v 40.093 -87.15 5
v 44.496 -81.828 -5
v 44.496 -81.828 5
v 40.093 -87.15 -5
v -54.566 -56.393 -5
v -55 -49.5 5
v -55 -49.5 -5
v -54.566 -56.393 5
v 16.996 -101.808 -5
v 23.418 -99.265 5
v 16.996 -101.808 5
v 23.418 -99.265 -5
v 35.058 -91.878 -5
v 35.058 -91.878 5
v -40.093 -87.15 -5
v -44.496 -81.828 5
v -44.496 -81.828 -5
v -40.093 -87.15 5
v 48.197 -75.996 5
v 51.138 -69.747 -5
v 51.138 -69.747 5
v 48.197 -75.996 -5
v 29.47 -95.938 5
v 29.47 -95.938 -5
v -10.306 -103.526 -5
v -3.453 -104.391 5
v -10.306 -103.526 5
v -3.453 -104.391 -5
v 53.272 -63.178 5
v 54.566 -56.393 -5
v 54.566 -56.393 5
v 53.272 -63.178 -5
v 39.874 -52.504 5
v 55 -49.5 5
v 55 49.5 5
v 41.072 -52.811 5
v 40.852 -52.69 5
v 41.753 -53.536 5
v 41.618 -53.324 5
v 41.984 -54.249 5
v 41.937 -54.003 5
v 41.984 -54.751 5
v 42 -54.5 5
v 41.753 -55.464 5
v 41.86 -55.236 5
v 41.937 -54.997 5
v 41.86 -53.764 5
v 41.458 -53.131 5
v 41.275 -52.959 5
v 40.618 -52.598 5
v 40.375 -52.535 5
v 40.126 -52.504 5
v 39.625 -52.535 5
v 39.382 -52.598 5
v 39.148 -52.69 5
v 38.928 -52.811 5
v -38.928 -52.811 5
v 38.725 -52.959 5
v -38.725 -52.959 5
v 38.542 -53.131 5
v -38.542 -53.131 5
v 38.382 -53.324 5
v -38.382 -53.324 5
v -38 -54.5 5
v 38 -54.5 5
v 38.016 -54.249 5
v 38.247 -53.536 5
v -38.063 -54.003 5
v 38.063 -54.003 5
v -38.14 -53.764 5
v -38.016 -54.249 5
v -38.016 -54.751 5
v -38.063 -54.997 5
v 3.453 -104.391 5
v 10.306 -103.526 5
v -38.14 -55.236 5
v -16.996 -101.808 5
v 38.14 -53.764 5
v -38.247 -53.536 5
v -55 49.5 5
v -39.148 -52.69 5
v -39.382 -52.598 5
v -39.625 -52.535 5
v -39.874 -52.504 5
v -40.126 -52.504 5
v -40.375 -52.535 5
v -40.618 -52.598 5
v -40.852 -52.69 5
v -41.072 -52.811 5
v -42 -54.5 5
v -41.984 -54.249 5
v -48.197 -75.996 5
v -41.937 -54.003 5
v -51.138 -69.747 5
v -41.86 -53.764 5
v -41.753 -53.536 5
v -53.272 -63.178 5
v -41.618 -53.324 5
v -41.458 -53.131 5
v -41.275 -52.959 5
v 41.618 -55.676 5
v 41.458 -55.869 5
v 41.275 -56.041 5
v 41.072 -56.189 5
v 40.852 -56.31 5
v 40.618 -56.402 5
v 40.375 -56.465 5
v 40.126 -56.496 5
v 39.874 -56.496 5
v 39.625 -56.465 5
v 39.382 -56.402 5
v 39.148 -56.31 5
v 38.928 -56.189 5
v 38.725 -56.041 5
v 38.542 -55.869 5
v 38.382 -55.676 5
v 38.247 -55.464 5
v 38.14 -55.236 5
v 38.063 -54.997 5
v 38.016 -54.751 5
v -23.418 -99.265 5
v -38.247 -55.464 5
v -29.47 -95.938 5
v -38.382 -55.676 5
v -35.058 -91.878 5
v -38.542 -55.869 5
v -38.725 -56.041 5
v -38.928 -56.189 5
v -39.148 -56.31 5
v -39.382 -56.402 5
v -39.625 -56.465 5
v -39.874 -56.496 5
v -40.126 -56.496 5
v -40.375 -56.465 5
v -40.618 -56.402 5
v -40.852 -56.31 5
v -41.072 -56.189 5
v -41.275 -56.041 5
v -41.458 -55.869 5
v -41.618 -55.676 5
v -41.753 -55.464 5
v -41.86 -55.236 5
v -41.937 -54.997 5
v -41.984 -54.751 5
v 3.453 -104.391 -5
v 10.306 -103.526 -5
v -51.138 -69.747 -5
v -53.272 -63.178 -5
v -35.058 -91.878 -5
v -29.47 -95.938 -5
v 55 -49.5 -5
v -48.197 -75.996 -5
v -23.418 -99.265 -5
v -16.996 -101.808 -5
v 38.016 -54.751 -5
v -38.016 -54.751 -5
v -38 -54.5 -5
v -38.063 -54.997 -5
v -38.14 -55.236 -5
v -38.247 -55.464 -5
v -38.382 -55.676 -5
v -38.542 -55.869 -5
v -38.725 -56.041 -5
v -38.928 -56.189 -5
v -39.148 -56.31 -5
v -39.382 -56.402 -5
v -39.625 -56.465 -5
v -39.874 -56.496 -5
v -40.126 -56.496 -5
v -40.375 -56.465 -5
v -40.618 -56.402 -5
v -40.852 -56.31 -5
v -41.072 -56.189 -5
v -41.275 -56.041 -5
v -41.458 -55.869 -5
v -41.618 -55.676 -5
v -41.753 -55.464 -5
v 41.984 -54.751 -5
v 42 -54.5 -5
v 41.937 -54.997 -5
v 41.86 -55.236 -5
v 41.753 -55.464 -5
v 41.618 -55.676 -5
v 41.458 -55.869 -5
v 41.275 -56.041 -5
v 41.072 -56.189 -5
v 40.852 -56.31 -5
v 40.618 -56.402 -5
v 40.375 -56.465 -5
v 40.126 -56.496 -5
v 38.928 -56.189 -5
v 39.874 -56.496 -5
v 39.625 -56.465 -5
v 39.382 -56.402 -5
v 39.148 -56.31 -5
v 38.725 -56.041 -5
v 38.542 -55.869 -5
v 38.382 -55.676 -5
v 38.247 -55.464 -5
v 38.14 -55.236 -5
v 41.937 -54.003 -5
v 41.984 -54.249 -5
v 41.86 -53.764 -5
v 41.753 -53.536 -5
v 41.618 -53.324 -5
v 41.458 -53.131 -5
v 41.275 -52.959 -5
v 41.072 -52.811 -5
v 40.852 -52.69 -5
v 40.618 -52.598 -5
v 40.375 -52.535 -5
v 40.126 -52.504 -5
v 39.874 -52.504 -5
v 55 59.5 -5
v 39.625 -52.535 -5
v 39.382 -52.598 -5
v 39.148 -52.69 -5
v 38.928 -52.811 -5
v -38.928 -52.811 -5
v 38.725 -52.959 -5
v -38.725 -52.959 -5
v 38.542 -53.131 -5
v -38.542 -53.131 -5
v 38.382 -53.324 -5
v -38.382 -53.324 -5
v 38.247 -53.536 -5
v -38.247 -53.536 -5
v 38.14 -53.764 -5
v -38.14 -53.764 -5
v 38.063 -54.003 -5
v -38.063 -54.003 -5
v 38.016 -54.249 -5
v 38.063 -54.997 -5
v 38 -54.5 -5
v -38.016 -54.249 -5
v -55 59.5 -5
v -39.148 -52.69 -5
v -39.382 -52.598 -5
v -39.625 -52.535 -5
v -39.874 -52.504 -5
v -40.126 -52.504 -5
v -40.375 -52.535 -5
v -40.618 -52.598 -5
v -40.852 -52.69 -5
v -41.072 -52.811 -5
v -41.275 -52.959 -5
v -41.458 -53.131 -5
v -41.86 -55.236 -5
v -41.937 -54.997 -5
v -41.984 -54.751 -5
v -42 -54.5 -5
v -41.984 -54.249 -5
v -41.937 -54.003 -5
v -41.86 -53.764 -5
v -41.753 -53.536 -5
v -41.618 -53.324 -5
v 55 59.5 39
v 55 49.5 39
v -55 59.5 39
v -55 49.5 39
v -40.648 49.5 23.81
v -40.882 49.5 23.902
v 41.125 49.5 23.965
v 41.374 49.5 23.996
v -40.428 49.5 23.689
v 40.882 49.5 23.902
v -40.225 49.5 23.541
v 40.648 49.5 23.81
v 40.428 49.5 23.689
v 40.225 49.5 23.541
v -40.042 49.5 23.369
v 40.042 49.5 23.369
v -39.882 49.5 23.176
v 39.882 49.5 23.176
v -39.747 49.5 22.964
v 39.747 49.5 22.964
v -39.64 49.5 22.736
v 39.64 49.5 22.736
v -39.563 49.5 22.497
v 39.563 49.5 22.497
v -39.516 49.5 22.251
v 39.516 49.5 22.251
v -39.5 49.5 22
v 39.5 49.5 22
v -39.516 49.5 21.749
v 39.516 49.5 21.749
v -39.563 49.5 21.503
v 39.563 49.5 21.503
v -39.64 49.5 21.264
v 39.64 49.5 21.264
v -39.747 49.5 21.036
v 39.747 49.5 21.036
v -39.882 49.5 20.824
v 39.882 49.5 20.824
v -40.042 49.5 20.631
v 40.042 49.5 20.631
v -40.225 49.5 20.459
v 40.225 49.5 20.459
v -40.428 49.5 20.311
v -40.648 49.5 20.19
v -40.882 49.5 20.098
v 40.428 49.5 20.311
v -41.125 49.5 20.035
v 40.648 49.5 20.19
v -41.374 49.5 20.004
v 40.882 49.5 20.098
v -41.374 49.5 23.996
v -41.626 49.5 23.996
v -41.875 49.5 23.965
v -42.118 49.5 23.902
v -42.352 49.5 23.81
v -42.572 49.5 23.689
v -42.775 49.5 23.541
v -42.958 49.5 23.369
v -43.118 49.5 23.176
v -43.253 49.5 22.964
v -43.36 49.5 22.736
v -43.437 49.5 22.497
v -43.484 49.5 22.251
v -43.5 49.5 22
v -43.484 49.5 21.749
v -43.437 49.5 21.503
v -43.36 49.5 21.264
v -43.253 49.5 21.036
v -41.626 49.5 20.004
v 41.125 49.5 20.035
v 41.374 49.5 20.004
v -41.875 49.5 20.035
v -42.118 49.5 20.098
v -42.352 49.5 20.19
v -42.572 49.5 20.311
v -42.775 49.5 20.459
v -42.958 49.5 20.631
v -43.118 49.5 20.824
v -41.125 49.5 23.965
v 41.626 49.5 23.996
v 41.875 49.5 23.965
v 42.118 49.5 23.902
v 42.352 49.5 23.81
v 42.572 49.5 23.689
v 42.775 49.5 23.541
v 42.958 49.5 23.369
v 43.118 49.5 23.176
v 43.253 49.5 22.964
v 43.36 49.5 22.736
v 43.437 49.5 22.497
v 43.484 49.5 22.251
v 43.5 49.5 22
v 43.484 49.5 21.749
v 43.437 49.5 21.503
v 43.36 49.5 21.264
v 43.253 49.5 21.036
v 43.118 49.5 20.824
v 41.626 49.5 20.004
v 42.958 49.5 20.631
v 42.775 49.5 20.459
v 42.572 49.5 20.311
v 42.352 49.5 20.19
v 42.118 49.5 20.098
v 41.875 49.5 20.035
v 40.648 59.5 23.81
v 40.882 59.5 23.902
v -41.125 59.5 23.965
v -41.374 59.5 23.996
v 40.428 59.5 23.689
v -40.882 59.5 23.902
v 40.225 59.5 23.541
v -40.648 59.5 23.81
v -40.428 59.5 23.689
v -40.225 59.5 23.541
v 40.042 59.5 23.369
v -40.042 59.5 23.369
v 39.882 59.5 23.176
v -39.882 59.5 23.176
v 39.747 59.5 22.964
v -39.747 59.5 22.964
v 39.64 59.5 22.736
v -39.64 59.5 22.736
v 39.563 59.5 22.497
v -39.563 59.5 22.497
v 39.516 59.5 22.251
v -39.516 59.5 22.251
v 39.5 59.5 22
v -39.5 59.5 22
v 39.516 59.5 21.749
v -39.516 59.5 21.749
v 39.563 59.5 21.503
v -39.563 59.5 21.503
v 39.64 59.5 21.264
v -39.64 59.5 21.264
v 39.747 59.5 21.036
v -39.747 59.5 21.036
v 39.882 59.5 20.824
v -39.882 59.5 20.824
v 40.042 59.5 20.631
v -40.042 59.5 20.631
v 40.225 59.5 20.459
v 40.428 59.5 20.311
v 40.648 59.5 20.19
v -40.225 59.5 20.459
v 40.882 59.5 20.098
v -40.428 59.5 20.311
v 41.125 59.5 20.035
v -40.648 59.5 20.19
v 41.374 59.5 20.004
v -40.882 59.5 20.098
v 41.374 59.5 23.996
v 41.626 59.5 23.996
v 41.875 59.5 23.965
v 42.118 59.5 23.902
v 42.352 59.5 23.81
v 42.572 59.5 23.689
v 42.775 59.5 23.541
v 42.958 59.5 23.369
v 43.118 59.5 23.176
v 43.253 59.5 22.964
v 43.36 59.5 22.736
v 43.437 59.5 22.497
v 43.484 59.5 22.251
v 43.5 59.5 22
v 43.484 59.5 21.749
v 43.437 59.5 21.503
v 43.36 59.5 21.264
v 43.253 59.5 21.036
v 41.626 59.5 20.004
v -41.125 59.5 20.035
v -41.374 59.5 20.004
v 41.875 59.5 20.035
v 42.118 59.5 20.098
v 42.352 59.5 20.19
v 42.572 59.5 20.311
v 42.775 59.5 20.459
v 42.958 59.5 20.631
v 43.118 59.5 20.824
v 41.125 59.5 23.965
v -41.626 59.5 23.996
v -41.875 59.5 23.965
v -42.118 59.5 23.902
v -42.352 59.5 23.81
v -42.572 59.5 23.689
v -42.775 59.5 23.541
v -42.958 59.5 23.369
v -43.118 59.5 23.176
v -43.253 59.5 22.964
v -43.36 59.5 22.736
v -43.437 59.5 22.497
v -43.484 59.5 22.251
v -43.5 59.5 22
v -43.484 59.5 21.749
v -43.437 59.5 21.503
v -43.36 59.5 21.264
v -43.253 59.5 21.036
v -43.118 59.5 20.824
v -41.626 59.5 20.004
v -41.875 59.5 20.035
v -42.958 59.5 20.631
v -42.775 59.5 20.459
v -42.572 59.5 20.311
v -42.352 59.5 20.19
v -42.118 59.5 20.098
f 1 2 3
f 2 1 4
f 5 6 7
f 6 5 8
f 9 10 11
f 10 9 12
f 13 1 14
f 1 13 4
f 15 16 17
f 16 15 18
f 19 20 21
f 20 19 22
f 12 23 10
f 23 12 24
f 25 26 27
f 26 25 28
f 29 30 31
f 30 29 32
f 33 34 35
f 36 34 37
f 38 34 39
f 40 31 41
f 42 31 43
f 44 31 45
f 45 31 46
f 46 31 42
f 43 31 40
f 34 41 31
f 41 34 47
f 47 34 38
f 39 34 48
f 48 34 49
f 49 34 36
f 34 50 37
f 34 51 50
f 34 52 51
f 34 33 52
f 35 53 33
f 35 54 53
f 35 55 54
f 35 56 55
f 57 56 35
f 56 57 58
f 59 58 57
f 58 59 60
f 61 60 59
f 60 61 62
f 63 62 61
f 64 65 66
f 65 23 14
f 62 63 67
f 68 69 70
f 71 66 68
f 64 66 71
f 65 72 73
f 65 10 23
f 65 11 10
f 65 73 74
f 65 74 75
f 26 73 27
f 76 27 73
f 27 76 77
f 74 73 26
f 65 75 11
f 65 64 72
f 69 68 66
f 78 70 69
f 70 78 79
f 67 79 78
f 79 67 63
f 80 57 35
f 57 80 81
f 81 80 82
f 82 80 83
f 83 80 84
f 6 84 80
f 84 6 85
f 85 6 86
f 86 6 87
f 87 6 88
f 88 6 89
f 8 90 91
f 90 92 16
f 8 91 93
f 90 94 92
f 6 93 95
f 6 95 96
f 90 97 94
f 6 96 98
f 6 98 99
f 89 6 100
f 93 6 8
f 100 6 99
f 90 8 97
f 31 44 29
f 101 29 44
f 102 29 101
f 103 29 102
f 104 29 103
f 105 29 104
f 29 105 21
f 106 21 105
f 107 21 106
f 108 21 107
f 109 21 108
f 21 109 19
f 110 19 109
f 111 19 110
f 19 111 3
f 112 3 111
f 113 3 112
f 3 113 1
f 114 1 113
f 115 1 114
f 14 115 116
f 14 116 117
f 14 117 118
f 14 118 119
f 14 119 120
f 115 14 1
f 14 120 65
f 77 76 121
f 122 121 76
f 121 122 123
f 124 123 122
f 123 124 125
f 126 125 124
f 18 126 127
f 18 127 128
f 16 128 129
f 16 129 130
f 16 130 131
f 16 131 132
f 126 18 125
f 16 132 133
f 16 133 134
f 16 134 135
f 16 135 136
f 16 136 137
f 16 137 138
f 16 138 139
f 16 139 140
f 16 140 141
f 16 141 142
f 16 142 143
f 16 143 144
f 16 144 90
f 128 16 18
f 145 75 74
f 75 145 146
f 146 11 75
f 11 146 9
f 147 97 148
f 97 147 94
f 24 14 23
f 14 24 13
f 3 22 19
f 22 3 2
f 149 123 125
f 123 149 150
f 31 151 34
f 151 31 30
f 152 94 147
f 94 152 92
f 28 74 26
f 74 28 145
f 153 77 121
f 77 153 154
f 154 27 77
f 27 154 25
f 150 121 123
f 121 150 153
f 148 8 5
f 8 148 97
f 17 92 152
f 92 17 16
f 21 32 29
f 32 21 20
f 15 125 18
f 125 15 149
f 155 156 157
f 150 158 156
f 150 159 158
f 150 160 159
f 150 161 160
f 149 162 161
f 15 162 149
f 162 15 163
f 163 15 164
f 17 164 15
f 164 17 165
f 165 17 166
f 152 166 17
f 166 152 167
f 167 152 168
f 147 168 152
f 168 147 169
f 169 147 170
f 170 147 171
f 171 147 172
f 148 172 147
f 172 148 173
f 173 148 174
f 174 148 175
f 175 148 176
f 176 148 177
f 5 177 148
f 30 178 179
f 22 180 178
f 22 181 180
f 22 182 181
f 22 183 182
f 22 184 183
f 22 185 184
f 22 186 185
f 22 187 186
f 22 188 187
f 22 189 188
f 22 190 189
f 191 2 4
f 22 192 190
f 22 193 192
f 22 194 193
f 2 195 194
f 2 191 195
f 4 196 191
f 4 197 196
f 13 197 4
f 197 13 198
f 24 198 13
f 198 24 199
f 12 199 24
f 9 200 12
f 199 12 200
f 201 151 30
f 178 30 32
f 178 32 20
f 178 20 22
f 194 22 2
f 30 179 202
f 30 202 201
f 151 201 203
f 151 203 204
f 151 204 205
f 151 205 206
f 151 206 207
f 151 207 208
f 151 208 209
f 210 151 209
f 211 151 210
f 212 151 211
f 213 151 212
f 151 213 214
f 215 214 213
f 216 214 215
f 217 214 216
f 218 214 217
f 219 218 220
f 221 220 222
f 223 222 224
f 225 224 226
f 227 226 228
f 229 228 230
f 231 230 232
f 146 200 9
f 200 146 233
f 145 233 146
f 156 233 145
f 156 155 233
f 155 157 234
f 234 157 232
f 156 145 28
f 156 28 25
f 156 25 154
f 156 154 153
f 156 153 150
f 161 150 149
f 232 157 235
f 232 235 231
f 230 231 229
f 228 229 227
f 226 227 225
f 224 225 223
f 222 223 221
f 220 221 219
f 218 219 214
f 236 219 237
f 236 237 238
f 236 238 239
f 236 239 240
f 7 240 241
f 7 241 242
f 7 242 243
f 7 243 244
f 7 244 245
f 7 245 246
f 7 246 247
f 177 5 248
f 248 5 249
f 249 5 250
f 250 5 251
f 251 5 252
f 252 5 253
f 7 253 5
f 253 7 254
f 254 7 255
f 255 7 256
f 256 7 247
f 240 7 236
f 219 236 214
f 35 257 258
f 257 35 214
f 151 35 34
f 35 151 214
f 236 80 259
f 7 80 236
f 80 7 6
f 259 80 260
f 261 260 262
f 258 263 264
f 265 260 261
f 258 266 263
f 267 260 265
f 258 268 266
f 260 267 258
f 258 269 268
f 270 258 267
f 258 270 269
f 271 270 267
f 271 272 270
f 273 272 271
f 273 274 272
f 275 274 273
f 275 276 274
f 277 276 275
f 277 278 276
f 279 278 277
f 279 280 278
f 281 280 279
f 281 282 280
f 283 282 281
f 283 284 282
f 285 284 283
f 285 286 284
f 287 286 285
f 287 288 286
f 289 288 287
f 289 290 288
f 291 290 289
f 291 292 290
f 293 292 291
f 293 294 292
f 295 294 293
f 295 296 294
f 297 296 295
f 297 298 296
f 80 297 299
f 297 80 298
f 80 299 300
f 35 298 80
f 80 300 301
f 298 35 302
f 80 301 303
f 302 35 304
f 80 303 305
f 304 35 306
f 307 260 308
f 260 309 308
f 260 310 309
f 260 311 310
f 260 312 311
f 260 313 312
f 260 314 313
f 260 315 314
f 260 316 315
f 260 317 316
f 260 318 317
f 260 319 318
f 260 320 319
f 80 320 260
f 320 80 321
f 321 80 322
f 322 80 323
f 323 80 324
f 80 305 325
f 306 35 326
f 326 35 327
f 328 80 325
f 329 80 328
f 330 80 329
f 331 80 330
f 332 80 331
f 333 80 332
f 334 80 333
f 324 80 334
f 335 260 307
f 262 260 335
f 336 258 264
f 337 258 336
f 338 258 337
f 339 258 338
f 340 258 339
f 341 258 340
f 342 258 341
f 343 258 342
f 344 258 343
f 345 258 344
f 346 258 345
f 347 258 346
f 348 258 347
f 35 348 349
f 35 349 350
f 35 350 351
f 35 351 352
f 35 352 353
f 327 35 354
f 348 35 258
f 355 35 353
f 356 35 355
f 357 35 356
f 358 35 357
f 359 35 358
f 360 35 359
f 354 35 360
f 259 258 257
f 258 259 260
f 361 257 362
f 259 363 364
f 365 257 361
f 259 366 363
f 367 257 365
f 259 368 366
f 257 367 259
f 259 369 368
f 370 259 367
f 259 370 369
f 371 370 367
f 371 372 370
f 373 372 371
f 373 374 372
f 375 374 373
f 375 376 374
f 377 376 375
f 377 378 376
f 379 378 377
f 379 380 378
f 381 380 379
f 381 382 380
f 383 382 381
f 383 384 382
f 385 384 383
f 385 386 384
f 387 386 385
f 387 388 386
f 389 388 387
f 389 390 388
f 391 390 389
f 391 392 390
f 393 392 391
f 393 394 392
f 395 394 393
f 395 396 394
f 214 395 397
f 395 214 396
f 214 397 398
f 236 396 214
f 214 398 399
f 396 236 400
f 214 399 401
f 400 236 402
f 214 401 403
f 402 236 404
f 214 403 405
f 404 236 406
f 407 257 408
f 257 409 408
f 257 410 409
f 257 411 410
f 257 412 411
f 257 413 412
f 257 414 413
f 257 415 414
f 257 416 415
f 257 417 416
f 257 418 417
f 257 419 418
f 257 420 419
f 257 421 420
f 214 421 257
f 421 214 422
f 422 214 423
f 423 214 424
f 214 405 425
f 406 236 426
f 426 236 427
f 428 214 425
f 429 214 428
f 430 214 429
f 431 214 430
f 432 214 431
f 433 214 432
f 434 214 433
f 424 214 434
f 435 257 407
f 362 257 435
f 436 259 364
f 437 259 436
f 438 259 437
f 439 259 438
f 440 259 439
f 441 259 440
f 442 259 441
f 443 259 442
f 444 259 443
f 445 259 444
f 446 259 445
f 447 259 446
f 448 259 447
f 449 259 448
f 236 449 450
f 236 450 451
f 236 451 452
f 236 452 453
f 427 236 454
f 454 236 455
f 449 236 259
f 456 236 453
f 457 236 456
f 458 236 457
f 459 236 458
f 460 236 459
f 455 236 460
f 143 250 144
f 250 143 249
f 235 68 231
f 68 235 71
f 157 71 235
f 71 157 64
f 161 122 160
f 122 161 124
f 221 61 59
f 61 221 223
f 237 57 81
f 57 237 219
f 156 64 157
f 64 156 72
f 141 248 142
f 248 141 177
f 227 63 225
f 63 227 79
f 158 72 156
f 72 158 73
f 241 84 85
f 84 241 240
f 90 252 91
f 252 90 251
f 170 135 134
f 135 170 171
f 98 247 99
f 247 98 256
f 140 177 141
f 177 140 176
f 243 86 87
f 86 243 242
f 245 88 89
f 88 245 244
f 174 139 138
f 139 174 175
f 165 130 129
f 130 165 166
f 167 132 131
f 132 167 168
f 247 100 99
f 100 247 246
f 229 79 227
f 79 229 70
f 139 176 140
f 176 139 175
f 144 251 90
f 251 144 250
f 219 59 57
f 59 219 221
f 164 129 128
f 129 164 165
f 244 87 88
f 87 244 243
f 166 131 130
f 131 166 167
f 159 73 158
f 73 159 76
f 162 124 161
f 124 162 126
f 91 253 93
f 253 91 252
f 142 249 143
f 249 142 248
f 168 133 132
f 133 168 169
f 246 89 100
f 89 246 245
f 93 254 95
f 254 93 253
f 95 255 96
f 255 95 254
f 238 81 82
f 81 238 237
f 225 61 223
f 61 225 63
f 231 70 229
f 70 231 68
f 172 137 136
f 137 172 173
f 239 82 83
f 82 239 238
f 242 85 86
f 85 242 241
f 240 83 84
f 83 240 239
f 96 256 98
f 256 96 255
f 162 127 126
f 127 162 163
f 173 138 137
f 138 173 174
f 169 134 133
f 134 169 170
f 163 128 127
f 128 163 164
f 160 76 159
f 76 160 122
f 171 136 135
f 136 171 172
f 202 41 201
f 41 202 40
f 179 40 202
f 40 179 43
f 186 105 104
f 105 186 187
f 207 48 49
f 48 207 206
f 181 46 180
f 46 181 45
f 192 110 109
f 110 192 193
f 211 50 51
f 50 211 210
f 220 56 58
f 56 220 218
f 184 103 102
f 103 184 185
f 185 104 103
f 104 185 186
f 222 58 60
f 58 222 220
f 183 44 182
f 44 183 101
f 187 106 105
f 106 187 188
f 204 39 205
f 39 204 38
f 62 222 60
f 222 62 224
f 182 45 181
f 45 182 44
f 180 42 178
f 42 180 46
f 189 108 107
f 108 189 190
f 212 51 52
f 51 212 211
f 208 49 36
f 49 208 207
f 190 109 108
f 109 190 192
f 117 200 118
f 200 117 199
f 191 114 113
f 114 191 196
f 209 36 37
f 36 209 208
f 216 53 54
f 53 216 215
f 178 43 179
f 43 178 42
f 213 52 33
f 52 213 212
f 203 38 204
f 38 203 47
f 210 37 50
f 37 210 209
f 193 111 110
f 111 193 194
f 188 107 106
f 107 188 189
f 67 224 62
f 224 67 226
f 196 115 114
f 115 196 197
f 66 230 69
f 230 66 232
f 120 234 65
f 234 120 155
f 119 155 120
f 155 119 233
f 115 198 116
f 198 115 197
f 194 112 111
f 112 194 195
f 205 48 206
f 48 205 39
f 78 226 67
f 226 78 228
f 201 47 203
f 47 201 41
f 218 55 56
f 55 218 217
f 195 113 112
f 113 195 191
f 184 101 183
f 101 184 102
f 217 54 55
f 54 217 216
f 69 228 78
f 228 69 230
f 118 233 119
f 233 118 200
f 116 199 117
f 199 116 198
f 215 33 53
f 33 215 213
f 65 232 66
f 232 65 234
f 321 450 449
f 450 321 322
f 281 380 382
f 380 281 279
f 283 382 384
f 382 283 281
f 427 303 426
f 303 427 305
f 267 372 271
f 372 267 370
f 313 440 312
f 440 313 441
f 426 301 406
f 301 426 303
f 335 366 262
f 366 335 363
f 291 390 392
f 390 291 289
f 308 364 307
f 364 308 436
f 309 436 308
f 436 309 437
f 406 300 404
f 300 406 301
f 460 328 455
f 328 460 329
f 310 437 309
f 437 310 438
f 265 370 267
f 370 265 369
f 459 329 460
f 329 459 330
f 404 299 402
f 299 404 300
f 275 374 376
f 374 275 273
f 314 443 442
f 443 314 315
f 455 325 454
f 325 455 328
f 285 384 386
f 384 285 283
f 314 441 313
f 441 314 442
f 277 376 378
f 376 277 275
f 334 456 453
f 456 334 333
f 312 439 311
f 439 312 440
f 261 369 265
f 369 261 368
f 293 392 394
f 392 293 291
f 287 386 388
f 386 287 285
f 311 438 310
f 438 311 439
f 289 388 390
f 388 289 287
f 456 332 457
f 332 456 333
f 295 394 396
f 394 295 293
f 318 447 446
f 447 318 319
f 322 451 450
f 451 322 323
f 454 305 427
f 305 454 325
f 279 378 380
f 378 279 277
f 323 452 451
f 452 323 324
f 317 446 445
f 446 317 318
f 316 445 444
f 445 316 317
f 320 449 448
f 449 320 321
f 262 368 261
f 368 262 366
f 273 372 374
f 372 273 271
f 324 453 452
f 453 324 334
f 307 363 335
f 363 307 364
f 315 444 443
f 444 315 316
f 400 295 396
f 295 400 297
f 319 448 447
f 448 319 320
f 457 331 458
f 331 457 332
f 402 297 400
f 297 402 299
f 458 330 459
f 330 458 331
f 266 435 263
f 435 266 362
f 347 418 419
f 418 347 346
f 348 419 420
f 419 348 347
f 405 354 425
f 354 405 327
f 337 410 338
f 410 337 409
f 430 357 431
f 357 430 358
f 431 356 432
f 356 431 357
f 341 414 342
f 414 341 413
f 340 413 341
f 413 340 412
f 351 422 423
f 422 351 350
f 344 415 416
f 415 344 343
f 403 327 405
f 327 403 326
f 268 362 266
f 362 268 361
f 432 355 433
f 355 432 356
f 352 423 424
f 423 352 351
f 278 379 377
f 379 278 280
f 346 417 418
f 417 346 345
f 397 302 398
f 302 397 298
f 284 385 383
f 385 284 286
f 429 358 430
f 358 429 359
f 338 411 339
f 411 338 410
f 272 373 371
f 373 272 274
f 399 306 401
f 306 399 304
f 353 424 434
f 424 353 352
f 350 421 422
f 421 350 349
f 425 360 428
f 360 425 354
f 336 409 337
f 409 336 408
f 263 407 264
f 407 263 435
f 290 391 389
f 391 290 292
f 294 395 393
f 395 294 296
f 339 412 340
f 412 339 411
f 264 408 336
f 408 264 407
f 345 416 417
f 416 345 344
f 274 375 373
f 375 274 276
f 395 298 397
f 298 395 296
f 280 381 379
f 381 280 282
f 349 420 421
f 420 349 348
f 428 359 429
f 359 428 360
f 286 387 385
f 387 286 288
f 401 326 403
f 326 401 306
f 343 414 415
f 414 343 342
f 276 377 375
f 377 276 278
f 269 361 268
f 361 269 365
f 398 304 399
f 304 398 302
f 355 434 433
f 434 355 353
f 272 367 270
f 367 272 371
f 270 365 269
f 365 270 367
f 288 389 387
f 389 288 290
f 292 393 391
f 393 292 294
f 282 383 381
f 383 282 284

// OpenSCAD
//made for swann ads440 pt wireless camera.
$fn=50;
//Length
L1 = 154;
//width
W1 = 110;

//height of back
H1 = 44;
//global thickness
T1 = 10;

//hole diameter
D1= 4;

//hole separation center at platform
HL1 = 80;
//hole separation center at back
HL2 = 83;
//hole location from the front
HL3 = 50;

difference(){
    
 union() {
translate([0,-(L1+W1/-2)/2,0])
cylinder(h = T1, d1 = W1, d2 = W1, center = true);
 
rotate([0,0,0])
translate([0,0,0])
cube([W1,L1-W1/2,T1], center=true);
rotate([0,0,0])
translate([0,+(L1+W1/-2)/2+T1/2,H1/2-T1/2])
cube([W1,T1,H1], center=true);   
 }  
    
    
union() {
translate([-HL1/2,-(L1-W1/2)/2-W1/2+HL3,0])
cylinder(h = T1*2, d1 = D1, d2 = D1, center = true);
translate([ HL1/2,-(L1-W1/2)/2-W1/2+HL3,0])
cylinder(h = T1*2, d1 = D1, d2 = D1, center = true);

rotate([90,0,0])
translate([-HL2/2,H1/2,-(L1+W1/-2)/2-T1/2])
cylinder(h = T1*2, d1 = D1, d2 = D1, center = true);
rotate([90,0,0])
translate([ HL2/2,H1/2,-(L1+W1/-2)/2-T1/2])
cylinder(h = T1*2, d1 = D1, d2 = D1, center = true);
}


 

}
